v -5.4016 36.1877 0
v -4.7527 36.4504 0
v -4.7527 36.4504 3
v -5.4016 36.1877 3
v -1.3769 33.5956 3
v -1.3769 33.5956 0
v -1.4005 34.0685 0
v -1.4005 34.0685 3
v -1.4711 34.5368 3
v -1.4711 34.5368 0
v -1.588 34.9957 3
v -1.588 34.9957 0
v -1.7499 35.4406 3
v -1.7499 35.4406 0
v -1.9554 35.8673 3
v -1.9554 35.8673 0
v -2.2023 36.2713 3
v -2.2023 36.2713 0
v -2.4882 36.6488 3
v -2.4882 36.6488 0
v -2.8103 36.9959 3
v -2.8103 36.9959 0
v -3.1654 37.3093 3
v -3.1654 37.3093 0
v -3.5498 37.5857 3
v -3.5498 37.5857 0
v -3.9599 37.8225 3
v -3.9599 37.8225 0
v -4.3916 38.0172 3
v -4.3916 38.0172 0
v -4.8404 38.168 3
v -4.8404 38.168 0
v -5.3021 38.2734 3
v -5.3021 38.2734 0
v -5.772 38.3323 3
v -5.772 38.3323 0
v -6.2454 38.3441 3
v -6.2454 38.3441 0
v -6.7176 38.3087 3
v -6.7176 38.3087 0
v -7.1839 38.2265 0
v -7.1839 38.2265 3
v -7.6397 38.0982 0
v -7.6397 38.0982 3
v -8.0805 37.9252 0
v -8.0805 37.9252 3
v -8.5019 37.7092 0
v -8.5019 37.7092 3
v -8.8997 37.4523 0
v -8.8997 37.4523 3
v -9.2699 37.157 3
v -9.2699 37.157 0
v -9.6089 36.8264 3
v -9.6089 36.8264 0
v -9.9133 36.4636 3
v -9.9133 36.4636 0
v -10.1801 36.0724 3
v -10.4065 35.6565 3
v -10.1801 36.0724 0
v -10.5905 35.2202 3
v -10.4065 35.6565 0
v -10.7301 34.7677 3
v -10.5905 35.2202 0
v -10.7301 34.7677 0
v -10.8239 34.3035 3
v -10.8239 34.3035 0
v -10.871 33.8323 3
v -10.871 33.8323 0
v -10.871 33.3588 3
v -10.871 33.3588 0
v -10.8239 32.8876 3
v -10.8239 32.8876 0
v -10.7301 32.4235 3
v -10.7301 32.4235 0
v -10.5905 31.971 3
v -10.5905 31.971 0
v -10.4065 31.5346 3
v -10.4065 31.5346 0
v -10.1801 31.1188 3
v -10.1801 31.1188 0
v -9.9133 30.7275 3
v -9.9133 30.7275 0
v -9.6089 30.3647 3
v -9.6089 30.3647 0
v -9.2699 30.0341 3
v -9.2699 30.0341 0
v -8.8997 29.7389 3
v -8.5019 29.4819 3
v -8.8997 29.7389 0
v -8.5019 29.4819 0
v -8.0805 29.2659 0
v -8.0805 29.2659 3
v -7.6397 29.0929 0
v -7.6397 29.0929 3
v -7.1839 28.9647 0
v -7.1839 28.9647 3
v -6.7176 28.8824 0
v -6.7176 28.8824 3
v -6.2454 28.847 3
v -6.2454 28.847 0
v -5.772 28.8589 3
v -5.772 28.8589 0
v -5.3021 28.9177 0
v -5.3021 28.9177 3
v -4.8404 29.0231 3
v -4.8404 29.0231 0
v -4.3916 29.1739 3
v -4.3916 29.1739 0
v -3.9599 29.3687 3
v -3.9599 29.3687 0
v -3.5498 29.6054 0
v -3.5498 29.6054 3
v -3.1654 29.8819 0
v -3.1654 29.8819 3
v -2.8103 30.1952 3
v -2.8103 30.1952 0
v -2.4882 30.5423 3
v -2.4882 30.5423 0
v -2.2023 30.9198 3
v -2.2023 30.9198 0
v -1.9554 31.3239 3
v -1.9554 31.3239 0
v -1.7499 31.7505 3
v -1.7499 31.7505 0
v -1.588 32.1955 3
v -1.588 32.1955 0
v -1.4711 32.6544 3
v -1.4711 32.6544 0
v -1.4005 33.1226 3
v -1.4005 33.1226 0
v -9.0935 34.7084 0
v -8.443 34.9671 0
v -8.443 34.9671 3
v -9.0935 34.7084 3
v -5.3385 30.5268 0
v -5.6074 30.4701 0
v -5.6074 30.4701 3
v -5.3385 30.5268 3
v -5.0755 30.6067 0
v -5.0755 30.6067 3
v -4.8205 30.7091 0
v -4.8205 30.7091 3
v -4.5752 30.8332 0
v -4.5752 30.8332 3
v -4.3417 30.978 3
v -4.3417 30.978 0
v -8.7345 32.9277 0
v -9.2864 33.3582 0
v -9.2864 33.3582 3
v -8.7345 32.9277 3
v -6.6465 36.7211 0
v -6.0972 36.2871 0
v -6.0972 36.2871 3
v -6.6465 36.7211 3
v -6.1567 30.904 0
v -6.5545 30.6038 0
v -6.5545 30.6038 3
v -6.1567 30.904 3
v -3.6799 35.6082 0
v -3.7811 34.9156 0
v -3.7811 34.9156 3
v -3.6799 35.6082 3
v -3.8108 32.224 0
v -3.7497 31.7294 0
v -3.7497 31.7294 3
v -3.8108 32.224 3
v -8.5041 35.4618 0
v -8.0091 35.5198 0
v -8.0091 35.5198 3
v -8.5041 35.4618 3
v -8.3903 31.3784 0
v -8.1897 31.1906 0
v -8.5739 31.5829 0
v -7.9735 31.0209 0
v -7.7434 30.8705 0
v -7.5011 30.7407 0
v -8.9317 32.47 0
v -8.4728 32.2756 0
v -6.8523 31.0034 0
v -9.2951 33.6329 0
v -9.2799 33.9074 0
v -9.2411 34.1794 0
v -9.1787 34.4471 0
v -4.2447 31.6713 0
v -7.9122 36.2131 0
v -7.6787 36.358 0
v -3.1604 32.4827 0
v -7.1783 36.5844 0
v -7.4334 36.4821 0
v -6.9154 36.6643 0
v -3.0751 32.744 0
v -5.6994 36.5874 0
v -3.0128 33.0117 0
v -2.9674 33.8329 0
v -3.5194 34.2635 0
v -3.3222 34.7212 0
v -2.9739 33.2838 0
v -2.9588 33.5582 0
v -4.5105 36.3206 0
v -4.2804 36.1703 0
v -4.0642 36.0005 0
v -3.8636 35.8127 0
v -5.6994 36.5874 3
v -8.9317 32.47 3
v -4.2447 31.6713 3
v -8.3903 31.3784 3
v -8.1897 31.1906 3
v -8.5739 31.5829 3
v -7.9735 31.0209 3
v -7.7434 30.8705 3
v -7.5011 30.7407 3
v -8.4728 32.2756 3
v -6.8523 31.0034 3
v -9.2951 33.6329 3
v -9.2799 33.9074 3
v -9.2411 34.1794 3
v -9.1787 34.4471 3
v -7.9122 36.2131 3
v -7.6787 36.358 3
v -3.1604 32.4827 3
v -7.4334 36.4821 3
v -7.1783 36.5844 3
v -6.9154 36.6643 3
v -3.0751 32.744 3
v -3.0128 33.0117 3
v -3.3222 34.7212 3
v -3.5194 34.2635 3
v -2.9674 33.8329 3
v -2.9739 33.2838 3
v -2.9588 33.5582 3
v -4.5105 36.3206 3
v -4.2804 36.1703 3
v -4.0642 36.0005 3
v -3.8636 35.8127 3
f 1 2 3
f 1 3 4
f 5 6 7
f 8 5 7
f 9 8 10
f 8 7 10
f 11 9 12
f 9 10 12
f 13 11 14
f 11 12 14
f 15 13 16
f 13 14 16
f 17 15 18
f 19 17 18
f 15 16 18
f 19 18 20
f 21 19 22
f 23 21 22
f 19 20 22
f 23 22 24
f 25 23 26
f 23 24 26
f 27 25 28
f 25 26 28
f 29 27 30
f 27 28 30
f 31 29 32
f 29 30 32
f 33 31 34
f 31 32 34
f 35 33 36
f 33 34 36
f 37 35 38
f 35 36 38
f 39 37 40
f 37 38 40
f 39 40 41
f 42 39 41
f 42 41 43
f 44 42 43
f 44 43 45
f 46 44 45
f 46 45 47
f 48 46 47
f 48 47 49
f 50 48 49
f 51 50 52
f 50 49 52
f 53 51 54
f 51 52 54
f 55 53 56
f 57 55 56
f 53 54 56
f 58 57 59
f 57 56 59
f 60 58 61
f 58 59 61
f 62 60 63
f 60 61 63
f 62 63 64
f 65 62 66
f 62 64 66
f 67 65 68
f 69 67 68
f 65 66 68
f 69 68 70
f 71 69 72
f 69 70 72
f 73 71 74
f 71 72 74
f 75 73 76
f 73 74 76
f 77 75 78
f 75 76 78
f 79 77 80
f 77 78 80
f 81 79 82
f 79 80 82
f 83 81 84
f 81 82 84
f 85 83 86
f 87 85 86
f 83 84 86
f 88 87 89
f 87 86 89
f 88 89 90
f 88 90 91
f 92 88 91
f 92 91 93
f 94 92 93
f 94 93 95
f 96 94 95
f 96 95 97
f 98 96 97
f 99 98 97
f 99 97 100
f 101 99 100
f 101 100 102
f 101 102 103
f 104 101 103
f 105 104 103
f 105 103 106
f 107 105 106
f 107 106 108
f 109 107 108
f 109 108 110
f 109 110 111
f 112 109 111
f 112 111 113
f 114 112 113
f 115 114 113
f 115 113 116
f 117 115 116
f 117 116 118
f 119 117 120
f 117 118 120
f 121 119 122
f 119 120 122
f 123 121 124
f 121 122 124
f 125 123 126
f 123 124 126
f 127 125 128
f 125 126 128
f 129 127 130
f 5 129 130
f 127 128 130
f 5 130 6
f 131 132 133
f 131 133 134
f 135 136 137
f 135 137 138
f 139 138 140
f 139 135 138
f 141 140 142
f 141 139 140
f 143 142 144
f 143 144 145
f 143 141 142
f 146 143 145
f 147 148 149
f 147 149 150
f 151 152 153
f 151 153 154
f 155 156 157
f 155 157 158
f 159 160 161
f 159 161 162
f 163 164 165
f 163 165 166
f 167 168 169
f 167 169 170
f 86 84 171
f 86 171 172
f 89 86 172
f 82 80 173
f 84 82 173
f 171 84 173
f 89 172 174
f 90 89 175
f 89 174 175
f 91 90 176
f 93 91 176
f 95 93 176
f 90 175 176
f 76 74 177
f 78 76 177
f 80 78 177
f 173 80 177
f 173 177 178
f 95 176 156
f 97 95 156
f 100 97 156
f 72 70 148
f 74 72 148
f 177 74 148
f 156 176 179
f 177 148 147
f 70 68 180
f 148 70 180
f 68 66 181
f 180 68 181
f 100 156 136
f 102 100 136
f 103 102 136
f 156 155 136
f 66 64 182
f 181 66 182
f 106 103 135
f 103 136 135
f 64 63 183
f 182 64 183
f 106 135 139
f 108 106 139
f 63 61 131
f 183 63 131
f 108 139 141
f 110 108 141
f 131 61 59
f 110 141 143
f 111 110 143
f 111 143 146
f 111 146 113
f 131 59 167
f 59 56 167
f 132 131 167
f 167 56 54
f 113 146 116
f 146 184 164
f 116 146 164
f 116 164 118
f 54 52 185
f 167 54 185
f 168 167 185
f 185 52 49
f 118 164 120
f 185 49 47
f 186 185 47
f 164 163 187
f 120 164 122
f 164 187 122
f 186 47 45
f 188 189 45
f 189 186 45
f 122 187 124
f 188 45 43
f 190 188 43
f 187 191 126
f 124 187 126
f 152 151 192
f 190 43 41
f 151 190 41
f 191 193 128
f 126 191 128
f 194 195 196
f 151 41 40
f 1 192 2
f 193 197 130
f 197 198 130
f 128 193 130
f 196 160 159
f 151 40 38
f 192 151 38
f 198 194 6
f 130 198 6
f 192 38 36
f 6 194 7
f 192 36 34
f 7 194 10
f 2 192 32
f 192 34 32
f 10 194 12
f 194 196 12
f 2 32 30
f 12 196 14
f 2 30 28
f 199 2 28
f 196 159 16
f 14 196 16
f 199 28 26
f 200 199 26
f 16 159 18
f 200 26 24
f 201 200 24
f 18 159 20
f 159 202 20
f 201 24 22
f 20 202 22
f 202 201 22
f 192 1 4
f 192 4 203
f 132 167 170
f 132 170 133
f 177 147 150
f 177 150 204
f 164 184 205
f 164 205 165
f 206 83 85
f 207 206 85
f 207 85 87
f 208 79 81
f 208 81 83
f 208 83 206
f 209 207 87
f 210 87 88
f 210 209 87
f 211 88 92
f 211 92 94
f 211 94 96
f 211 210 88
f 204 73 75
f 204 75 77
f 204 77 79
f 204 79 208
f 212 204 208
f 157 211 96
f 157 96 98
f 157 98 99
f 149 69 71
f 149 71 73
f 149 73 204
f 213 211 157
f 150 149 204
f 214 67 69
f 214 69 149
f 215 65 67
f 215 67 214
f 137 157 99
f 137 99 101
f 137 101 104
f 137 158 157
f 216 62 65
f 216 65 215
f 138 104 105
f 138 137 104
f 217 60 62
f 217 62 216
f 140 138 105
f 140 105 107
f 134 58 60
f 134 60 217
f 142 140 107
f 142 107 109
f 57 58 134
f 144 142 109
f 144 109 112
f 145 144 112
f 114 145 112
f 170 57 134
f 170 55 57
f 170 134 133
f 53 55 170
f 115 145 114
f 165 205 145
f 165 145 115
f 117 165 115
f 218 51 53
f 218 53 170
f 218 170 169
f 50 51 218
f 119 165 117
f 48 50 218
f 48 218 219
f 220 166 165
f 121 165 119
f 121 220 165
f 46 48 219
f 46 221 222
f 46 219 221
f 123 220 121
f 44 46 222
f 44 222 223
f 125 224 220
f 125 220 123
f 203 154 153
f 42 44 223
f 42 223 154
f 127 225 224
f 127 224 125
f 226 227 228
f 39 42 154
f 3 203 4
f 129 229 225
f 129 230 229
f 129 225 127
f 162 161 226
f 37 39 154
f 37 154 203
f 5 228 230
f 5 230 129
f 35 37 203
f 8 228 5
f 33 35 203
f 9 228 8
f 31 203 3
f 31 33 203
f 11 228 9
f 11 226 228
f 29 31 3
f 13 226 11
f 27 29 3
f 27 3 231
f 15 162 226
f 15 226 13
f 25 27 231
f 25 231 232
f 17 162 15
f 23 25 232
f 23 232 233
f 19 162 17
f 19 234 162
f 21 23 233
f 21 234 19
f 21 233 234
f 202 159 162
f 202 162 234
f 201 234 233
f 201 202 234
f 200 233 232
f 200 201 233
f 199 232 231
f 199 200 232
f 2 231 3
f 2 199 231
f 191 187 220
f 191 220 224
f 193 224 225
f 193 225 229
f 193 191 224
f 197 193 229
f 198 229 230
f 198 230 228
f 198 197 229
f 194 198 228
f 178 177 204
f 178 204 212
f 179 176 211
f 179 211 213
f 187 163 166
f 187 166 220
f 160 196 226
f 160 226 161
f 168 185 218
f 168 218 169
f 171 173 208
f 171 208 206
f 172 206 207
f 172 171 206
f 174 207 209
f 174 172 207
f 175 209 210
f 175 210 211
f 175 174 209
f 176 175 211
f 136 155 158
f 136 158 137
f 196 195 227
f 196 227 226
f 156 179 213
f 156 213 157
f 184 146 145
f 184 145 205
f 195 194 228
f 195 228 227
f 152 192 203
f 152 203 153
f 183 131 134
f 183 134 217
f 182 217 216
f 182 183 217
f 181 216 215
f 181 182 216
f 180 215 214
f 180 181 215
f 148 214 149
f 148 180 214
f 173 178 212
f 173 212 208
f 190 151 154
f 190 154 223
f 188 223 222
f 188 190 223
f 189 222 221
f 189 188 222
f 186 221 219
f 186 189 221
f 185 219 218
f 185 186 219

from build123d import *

# Parameters (mm, degrees)
SKETCH5_R           = 4.75
BOSS_EXTRUDE1_DEPTH = 3


with BuildPart() as part:
    # Sketch5 → Boss-Extrude1 (new body)
    with BuildSketch(Plane.XY):
        with Locations((-6.126935789, 33.595569574)):
            Circle(SKETCH5_R)
        with BuildLine():
            Line((-6.156694041, 30.903989601), (-5.607416869, 30.470060358))
            ThreePointArc((-5.607416869, 30.470060358), (-4.946880208, 30.65513141), (-4.341658129, 30.978034198))
            Line((-4.341658129, 30.978034198), (-4.244743599, 31.671292861))
            Line((-4.244743599, 31.671292861), (-3.749736881, 31.729366119))
            Line((-3.749736881, 31.729366119), (-3.810838281, 32.224008185))
            Line((-3.810838281, 32.224008185), (-3.160405947, 32.482731548))
            ThreePointArc((-3.160405947, 32.482731548), (-2.99041385, 33.147308603), (-2.967444827, 33.832897692))
            Line((-2.967444827, 33.832897692), (-3.519367176, 34.263457468))
            Line((-3.519367176, 34.263457468), (-3.322156734, 34.721182491))
            Line((-3.322156734, 34.721182491), (-3.781080029, 34.915588159))
            Line((-3.781080029, 34.915588159), (-3.679924867, 35.608240765))
            ThreePointArc((-3.679924867, 35.608240765), (-4.170469431, 36.087746767), (-4.752722487, 36.450433069))
            Line((-4.752722487, 36.450433069), (-5.401559365, 36.187734182))
            Line((-5.401559365, 36.187734182), (-5.699355642, 36.587385946))
            Line((-5.699355642, 36.587385946), (-6.097177536, 36.287149548))
            Line((-6.097177536, 36.287149548), (-6.646454709, 36.721078791))
            ThreePointArc((-6.646454709, 36.721078791), (-7.30699137, 36.536007739), (-7.912213449, 36.213104951))
            Line((-7.912213449, 36.213104951), (-8.009127978, 35.519846288))
            Line((-8.009127978, 35.519846288), (-8.504134696, 35.46177303))
            Line((-8.504134696, 35.46177303), (-8.443033296, 34.967130964))
            Line((-8.443033296, 34.967130964), (-9.09346563, 34.7084076))
            ThreePointArc((-9.09346563, 34.7084076), (-9.263457727, 34.043830546), (-9.28642675, 33.358241457))
            Line((-9.28642675, 33.358241457), (-8.734504401, 32.92768168))
            Line((-8.734504401, 32.92768168), (-8.931714844, 32.469956658))
            Line((-8.931714844, 32.469956658), (-8.472791548, 32.27555099))
            Line((-8.472791548, 32.27555099), (-8.57394671, 31.582898384))
            ThreePointArc((-8.57394671, 31.582898384), (-8.083402147, 31.103392381), (-7.50114909, 30.74070608))
            Line((-7.50114909, 30.74070608), (-6.852312212, 31.003404967))
            Line((-6.852312212, 31.003404967), (-6.554515936, 30.603753203))
            Line((-6.554515936, 30.603753203), (-6.156694041, 30.903989601))
        make_face(mode=Mode.SUBTRACT)
    extrude(amount=BOSS_EXTRUDE1_DEPTH)


solid = part.part
